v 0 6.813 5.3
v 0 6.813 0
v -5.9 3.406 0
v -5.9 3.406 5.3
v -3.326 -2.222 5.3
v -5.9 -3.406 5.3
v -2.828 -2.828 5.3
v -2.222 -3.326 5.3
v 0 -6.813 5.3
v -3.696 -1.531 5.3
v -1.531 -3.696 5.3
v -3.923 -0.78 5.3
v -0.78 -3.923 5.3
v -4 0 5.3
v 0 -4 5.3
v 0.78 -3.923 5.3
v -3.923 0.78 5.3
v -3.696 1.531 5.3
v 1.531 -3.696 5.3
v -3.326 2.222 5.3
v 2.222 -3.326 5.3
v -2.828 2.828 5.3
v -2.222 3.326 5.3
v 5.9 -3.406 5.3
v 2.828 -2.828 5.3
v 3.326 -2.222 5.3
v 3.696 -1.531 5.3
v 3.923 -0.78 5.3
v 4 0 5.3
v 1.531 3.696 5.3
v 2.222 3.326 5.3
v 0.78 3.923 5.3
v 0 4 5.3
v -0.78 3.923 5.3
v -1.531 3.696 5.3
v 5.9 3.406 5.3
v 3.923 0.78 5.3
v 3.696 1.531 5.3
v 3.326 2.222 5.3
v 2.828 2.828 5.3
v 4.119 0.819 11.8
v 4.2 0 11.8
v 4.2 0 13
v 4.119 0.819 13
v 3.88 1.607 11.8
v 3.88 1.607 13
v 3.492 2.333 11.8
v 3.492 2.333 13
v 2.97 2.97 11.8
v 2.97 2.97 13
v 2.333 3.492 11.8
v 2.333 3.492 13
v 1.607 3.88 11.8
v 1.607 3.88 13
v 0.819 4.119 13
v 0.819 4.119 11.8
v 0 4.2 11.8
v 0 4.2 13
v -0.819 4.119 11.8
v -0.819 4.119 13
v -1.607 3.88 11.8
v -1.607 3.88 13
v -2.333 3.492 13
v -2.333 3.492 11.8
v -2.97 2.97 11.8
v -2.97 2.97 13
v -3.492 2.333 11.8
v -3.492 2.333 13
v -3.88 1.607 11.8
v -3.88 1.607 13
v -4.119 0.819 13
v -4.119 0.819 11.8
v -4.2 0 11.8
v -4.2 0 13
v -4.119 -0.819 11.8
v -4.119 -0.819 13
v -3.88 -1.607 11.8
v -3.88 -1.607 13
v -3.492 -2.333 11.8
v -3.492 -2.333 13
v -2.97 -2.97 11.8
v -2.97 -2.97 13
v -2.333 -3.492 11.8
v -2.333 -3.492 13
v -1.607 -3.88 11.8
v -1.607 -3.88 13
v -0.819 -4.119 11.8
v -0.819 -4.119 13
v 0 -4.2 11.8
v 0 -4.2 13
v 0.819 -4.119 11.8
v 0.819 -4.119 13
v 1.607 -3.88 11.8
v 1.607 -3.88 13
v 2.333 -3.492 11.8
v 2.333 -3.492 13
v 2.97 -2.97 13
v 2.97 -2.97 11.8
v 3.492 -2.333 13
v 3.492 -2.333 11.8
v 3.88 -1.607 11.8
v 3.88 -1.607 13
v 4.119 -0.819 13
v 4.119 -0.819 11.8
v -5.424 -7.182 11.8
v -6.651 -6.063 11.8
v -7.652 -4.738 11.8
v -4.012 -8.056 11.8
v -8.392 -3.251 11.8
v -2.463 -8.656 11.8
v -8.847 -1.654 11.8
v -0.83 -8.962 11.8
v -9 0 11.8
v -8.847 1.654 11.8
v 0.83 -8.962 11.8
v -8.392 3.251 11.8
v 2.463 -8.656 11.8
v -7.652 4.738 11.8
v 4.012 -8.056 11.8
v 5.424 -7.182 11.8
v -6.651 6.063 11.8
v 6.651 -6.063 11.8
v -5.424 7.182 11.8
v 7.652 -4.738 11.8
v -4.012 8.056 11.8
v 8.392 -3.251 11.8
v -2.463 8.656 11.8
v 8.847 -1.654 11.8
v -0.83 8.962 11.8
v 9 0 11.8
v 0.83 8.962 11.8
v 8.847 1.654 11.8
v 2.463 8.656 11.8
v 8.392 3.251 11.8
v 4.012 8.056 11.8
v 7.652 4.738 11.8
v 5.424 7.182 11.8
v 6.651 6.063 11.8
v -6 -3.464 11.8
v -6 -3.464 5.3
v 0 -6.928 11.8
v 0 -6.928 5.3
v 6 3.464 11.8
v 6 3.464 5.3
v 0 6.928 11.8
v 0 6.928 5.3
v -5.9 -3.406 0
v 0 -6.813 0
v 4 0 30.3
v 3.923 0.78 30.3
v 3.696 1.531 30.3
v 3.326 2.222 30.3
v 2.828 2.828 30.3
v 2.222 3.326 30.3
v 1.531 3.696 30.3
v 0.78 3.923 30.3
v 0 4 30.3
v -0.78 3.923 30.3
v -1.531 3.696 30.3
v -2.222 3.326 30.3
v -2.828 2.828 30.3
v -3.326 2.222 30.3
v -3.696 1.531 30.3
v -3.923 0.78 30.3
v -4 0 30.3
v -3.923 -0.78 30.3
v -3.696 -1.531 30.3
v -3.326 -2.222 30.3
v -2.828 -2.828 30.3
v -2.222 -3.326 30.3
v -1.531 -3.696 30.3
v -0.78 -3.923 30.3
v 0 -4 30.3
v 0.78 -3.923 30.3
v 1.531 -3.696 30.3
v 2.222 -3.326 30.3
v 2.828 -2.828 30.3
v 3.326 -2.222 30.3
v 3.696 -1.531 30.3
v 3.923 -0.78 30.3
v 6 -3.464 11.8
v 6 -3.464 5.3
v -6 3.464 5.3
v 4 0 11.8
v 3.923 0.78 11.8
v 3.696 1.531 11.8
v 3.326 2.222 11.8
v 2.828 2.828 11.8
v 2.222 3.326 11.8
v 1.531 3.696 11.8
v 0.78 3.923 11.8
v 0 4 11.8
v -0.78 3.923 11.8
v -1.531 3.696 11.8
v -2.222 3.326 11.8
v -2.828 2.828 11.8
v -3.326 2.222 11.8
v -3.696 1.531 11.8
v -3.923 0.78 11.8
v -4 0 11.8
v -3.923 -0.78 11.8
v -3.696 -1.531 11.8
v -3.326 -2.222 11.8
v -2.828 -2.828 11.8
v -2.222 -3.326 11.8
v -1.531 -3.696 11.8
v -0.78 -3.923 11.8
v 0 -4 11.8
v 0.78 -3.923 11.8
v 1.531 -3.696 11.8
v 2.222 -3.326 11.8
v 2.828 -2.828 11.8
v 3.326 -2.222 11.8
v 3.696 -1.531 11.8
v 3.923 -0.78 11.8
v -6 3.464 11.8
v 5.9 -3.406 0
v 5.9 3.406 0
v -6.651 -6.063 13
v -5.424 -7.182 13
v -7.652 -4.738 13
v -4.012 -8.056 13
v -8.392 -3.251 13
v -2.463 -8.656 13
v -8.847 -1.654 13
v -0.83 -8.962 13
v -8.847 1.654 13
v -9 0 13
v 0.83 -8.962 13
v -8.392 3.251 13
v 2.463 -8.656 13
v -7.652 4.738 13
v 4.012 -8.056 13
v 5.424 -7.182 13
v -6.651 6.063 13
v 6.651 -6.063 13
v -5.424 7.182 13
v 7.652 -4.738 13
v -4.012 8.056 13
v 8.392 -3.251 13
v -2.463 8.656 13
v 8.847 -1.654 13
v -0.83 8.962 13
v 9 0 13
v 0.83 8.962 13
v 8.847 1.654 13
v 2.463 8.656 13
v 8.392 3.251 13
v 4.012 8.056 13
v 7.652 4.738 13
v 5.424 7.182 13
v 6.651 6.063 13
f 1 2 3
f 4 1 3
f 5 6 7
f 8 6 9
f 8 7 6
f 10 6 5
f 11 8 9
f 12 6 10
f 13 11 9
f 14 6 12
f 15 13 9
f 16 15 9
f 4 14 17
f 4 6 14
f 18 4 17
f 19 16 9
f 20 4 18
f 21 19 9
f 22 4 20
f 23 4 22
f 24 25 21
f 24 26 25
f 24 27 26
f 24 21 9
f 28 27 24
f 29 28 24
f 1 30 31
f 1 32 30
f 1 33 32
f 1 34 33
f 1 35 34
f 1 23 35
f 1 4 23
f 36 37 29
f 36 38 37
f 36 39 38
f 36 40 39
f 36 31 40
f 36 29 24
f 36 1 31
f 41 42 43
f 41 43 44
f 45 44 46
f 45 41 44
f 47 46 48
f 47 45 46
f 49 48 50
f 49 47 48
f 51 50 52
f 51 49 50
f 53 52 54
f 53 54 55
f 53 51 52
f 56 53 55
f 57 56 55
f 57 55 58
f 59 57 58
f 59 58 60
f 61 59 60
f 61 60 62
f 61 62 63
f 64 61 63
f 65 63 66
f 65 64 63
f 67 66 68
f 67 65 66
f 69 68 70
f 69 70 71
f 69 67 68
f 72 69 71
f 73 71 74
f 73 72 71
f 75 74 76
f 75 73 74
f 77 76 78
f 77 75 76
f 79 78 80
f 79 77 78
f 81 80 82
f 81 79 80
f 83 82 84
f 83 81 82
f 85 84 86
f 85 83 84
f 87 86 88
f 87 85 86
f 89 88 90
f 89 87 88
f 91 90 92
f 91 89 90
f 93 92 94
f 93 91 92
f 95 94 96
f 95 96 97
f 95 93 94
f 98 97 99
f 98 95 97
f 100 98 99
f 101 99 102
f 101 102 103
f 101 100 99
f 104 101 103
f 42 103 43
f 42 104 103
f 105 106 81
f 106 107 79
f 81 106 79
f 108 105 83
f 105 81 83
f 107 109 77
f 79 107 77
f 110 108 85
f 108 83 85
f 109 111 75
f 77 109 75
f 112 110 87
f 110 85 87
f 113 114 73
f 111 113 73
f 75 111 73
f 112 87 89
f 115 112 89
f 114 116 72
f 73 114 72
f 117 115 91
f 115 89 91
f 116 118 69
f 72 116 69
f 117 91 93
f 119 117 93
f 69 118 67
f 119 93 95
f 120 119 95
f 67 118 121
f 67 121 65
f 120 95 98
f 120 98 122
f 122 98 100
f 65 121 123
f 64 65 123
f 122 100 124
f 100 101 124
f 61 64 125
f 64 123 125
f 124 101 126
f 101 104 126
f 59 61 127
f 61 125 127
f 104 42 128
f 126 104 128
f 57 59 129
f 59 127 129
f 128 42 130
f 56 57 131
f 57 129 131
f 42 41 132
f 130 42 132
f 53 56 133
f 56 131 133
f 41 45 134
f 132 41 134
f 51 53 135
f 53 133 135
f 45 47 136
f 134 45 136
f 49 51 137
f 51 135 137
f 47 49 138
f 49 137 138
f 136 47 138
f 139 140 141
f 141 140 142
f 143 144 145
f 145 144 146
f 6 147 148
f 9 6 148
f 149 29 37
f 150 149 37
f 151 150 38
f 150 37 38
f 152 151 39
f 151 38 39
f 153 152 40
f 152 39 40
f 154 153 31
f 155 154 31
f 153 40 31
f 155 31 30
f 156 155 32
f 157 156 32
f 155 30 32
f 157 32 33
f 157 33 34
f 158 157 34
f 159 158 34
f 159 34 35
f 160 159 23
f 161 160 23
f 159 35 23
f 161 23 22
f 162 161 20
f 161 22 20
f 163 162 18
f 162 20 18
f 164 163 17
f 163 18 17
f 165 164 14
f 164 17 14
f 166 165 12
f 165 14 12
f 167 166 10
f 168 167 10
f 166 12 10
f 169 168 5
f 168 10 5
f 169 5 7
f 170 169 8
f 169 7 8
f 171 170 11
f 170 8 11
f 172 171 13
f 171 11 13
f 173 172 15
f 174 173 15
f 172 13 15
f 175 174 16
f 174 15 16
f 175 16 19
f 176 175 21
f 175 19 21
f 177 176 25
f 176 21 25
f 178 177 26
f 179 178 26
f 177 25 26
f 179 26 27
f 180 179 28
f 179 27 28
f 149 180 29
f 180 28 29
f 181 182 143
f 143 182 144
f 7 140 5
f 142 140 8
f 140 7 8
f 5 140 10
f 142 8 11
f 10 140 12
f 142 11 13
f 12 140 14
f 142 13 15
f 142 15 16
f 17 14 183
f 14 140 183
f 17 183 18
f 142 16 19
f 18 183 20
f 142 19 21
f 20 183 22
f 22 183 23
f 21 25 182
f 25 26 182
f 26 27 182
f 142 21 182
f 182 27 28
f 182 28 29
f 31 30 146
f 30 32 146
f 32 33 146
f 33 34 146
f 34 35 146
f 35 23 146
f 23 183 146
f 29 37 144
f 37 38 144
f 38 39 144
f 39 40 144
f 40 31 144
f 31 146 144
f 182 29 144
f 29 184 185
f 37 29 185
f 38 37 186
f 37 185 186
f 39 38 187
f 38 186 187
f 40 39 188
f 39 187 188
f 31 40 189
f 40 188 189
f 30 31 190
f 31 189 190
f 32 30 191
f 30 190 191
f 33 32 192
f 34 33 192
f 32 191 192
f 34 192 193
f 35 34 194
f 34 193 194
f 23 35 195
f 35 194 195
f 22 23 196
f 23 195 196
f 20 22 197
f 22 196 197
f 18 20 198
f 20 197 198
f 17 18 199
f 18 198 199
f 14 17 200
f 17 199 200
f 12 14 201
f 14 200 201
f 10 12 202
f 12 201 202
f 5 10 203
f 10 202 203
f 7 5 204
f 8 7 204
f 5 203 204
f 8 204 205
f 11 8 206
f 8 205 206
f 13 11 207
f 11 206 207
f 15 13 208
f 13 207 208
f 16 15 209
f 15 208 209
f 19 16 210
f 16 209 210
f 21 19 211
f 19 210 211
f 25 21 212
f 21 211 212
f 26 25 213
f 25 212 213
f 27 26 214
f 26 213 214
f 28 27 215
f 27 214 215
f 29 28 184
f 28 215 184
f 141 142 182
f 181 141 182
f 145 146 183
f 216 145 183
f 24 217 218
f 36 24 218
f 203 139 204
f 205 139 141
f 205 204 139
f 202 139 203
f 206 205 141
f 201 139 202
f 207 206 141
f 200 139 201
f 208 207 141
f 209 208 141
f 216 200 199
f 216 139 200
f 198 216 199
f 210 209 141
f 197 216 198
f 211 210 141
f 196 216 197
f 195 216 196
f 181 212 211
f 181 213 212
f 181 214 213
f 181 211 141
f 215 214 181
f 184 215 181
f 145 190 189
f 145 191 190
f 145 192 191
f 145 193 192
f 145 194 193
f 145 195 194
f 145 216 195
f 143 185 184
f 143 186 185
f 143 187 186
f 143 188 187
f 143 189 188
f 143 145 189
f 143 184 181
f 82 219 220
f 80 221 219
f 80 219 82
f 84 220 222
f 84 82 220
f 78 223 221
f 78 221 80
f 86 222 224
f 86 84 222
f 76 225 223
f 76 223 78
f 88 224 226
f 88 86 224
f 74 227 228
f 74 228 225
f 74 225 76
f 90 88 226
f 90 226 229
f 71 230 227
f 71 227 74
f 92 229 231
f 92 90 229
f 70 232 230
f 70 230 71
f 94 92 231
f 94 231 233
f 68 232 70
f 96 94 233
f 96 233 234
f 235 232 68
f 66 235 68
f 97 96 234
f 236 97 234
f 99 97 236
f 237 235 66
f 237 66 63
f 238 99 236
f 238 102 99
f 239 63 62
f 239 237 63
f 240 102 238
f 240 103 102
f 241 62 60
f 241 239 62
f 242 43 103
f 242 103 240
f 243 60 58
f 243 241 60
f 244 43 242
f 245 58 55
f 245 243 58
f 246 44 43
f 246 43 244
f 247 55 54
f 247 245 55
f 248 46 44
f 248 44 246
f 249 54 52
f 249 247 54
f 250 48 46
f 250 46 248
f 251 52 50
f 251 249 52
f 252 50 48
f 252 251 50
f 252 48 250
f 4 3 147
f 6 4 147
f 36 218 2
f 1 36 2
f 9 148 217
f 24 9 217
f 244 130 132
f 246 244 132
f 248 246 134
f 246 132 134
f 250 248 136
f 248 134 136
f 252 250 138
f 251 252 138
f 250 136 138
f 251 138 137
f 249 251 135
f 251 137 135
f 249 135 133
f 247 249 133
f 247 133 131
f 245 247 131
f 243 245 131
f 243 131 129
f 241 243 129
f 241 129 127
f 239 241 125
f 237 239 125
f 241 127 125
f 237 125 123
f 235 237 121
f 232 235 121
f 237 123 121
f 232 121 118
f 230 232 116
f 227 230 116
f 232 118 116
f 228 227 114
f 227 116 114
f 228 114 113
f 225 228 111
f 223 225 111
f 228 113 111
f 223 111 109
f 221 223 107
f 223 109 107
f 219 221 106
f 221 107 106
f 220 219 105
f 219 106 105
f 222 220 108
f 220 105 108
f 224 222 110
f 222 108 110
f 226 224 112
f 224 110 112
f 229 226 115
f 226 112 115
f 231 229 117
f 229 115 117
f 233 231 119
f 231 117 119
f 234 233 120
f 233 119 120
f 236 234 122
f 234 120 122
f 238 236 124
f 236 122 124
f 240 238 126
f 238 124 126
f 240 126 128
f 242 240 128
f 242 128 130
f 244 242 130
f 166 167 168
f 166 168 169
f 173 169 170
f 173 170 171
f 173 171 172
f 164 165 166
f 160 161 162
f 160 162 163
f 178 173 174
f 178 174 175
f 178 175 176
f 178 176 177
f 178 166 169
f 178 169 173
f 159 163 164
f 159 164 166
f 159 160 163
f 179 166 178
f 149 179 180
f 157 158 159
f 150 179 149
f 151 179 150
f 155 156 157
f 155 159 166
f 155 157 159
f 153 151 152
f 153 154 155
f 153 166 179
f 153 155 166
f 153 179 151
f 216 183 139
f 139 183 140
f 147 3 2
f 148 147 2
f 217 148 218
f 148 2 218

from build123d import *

# Parameters (mm, degrees)
F1_DEPTH = 5.3
F2_R     = 4
F3_DEPTH = 25
F5_DEPTH = 6.5
F6_R     = 4
F7_DEPTH = 6.5
F8_R     = 9
F8_R_2   = 4.2
F9_DEPTH = 1.2


with BuildPart() as f1:
    # F0 (on Top) → F1 (new body)
    with BuildSketch(Plane.XY):
        Polygon((0, -6.8127331764), (5.9, -3.4063665882), (5.9, 3.4063665882), (0, 6.8127331764), (-5.9, 3.4063665882), (-5.9, -3.4063665882), align=None)
    extrude(amount=F1_DEPTH)

    # F2 (on face) → F3 (join)
    with BuildSketch(Plane.XY.offset(5.3)):
        Circle(F2_R)
    extrude(amount=F3_DEPTH)


with BuildPart() as f5:
    # F4 (on face) → F5 (new body)
    with BuildSketch(Plane.XY.offset(5.3)):
        Polygon((0, -6.9282032303), (6, -3.4641016151), (6, 3.4641016151), (0, 6.9282032303), (-6, 3.4641016151), (-6, -3.4641016151), align=None)
    extrude(amount=F5_DEPTH)

    # F6 (on face) → F7 (cut)
    with BuildSketch(Plane.XY.offset(11.8)):
        Circle(F6_R)
    extrude(amount=-F7_DEPTH, mode=Mode.SUBTRACT)


with BuildPart() as f9:
    # F8 (on face) → F9 (new body)
    with BuildSketch(Plane.XY.offset(11.8)):
        Circle(F8_R)
        Circle(F8_R_2, mode=Mode.SUBTRACT)
    extrude(amount=F9_DEPTH)


solid = Compound([f1.part, f5.part, f9.part])
